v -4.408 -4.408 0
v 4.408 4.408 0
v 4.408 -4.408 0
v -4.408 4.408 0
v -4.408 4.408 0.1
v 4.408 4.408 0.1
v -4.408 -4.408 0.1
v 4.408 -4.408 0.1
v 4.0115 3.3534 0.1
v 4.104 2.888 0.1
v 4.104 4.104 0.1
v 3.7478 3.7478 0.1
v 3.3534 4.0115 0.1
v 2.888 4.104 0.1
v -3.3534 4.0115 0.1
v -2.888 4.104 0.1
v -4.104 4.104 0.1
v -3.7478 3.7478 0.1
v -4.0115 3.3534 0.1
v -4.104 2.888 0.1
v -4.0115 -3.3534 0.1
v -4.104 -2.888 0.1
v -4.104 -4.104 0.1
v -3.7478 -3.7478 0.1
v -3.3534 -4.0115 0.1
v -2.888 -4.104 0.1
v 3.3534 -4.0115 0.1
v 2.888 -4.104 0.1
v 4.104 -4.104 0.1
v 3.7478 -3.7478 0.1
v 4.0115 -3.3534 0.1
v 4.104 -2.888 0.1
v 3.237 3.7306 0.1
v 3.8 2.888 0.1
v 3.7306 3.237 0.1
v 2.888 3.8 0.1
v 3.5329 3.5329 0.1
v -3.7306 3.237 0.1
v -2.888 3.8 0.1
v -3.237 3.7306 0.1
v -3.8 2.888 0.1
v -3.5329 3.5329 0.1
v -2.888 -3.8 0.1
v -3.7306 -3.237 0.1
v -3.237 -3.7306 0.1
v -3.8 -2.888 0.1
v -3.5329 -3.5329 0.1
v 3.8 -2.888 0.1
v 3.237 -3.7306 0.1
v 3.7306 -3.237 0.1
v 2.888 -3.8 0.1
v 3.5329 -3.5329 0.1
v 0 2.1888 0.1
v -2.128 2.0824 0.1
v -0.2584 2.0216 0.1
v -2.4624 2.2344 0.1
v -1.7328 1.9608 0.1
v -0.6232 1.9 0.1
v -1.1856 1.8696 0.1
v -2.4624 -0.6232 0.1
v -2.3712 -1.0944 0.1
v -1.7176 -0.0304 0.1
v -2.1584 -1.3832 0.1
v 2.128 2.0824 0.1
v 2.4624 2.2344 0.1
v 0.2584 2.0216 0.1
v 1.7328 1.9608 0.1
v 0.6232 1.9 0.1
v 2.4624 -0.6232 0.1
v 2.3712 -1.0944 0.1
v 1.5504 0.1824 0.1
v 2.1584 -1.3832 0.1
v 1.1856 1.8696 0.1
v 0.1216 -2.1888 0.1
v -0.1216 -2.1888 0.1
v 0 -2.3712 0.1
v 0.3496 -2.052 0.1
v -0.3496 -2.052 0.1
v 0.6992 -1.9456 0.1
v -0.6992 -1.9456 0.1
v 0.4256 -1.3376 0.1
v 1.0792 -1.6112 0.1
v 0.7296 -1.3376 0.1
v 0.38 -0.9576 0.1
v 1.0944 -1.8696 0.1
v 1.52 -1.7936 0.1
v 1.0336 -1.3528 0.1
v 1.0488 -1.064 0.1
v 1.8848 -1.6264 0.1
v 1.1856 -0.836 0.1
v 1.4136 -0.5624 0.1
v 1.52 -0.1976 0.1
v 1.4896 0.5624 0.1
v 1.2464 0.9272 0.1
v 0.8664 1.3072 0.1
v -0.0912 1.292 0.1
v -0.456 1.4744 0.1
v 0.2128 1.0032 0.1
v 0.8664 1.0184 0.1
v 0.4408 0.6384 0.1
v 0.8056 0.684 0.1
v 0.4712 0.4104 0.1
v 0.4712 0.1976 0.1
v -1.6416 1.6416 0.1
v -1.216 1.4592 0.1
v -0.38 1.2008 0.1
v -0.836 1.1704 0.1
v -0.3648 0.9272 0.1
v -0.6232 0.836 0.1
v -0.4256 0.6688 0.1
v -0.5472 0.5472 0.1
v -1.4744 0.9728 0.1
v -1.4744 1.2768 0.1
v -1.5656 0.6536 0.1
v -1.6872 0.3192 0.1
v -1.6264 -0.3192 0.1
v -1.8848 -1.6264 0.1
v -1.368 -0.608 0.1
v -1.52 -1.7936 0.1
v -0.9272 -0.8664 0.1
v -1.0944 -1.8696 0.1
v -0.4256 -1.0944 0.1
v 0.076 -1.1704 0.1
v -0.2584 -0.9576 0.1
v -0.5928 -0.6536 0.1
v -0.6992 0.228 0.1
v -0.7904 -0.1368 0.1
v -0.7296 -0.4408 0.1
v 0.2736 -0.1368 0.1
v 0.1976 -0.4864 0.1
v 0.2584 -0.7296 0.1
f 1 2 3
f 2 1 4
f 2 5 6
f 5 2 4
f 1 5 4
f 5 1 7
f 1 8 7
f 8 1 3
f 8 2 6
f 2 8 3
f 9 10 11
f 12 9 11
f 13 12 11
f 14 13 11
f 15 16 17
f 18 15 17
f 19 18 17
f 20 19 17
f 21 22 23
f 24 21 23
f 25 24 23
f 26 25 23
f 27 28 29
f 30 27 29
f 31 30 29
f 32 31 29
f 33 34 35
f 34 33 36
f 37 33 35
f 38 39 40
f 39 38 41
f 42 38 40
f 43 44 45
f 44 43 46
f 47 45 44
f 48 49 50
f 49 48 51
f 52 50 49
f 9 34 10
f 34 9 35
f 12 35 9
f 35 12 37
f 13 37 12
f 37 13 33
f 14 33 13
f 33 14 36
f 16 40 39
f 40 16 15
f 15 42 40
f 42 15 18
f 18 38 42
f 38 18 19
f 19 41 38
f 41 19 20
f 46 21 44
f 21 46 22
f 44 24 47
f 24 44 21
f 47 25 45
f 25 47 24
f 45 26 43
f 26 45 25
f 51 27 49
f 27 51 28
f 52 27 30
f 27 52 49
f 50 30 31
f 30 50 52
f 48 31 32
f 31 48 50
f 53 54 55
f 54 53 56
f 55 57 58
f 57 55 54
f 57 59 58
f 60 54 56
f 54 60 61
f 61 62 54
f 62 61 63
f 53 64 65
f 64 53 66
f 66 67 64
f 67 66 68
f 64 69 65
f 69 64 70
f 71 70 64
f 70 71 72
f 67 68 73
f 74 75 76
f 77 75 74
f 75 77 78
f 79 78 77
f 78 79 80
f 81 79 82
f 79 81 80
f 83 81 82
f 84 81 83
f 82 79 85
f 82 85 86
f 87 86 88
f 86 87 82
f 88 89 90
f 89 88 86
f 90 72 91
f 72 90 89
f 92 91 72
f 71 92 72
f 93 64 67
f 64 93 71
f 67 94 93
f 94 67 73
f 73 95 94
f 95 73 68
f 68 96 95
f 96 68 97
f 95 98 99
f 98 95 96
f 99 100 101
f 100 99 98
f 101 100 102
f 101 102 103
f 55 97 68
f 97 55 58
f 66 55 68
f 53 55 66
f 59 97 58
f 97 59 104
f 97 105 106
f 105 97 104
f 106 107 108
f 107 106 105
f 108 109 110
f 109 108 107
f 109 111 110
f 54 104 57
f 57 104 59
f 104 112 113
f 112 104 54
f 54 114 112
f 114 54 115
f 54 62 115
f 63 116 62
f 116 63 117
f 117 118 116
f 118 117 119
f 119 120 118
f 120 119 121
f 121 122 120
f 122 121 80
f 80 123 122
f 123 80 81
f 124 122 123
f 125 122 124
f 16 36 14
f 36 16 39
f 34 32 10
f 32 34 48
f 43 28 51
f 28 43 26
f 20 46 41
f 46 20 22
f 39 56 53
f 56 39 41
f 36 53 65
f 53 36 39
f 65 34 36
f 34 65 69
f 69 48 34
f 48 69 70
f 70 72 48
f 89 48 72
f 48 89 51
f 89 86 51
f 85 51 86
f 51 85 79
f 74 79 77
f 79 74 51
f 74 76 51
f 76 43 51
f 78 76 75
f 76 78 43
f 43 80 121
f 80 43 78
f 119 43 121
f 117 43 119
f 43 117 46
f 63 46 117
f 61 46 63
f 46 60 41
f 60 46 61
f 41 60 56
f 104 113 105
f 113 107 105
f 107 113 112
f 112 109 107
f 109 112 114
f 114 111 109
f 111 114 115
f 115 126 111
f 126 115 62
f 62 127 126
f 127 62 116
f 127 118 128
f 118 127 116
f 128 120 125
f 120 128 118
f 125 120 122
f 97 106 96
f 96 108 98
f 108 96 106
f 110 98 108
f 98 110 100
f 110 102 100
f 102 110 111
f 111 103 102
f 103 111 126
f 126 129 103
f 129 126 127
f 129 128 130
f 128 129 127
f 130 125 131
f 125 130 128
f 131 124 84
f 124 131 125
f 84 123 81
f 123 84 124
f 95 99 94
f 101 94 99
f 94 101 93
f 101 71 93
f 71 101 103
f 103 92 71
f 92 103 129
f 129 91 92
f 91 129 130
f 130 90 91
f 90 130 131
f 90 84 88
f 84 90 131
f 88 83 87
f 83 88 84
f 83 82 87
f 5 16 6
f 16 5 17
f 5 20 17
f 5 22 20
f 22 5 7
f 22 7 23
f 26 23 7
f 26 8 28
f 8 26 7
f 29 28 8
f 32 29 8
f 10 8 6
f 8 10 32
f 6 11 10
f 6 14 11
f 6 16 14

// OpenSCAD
// file: ../p/box5-12.scad
use <../lib.scad>
function ldraw_lib__box5_12() = [
// 0 Box with 5 Faces without Any Edges
// 0 Name: box5-12.dat
// 0 Author: Chris Dee [cwdee]
// 0 !LDRAW_ORG Primitive UPDATE 2009-02
// 0 !LICENSE Licensed under CC BY 4.0 : see CAreadme.txt
// 
// 0 BFC CERTIFY CCW
  [0,"BFC","CERTIFY"],
  [0,"BFC","CCW"],
// 
// 0 !HISTORY 2009-09-03 [PTadmin] Official Update 2009-02
// 
// 
// 4 16 1 1 1 1 1 -1 -1 1 -1 -1 1 1
  [4,16,1,1,1,1,1,-1,-1,1,-1,-1,1,1],
// 4 16 -1 0 1 1 0 1 1 1 1 -1 1 1
  [4,16,-1,0,1,1,0,1,1,1,1,-1,1,1],
// 4 16 -1 0 -1 -1 0 1 -1 1 1 -1 1 -1
  [4,16,-1,0,-1,-1,0,1,-1,1,1,-1,1,-1],
// 4 16 1 0 -1 -1 0 -1 -1 1 -1 1 1 -1
  [4,16,1,0,-1,-1,0,-1,-1,1,-1,1,1,-1],
// 4 16 1 0 1 1 0 -1 1 1 -1 1 1 1
  [4,16,1,0,1,1,0,-1,1,1,-1,1,1,1],
// 0
];
module ldraw_lib__box5_12(step=0, col=false, unit=2/5, alt=false, line=0.2, solid=!$preview)
    makepoly(ldraw_lib__box5_12(), step=step, col=col, unit=unit, alt=alt, line=line, solid=solid);
ldraw_lib__box5_12(line=0.2);
// file: ../p/1-4ring3.scad
use <../lib.scad>
function ldraw_lib__1_4ring3() = [
// 0 Ring  3 x 0.25
// 0 Name: 1-4ring3.dat
// 0 Author: Willy Tschager [Holly-Wood]
// 0 !LDRAW_ORG Primitive UPDATE 2024-01
// 0 !LICENSE Licensed under CC BY 4.0 : see CAreadme.txt
// 
// 0 BFC CERTIFY CCW
  [0,"BFC","CERTIFY"],
  [0,"BFC","CCW"],
// 
// 0 !HISTORY 1999-07-05 [PTadmin] Official Update 1999-05
// 0 !HISTORY 2003-01-21 [cavehop] Update Added BFC and 1 digit of significance
// 0 !HISTORY 2003-05-21 [cavehop] Corrected values as indicated by pneaster
// 0 !HISTORY 2003-06-12 [cavehop] Re-corrected values as indicated by pneaster
// 0 !HISTORY 2003-08-01 [PTadmin] Official Update 2003-02
// 0 !HISTORY 2007-06-22 [PTadmin] Header formatted for Contributor Agreement
// 0 !HISTORY 2008-07-01 [PTadmin] Official Update 2008-01
// 0 !HISTORY 2012-02-16 [Philo] Changed to CCW
// 0 !HISTORY 2012-03-30 [PTadmin] Official Update 2012-01
// 0 !HISTORY 2024-01-04 [Holly-Wood] Complete re-write, original by Karim Nassar
// 0 !HISTORY 2024-01-29 [OrionP] Official Update 2024-01
// 
// 4 16 4 0 0 3.6956 0 1.5308 2.7717 0 1.1481 3 0 0
  [4,16,4,0,0,3.6956,0,1.5308,2.7717,0,1.1481,3,0,0],
// 4 16 3.6956 0 1.5308 2.8284 0 2.8284 2.1213 0 2.1213 2.7717 0 1.1481
  [4,16,3.6956,0,1.5308,2.8284,0,2.8284,2.1213,0,2.1213,2.7717,0,1.1481],
// 4 16 2.8284 0 2.8284 1.5308 0 3.6956 1.1481 0 2.7717 2.1213 0 2.1213
  [4,16,2.8284,0,2.8284,1.5308,0,3.6956,1.1481,0,2.7717,2.1213,0,2.1213],
// 4 16 1.5308 0 3.6956 0 0 4 0 0 3 1.1481 0 2.7717
  [4,16,1.5308,0,3.6956,0,0,4,0,0,3,1.1481,0,2.7717],
// 0 // Build by LDPartEditor (PrimGen 2.X)
];
module ldraw_lib__1_4ring3(step=0, col=false, unit=2/5, alt=false, line=0.2, solid=!$preview)
    makepoly(ldraw_lib__1_4ring3(), step=step, col=col, unit=unit, alt=alt, line=line, solid=solid);
ldraw_lib__1_4ring3(line=0.2);
// file: ../p/1-4ndis.scad
use <../lib.scad>
function ldraw_lib__1_4ndis() = [
// 0 Disc Negative 0.25
// 0 Name: 1-4ndis.dat
// 0 Author: James Jessiman
// 0 !LDRAW_ORG Primitive UPDATE 2012-01
// 0 !LICENSE Licensed under CC BY 4.0 : see CAreadme.txt
// 
// 0 BFC CERTIFY CCW
  [0,"BFC","CERTIFY"],
  [0,"BFC","CCW"],
// 
// 0 !HISTORY 2002-03-23 [sbliss] Added BFC Statement
// 0 !HISTORY 2002-04-25 [PTadmin] Official Update 2002-02
// 0 !HISTORY 2007-06-22 [PTadmin] Header formatted for Contributor Agreement
// 0 !HISTORY 2008-07-01 [PTadmin] Official Update 2008-01
// 0 !HISTORY 2012-02-16 [Philo] Changed to CCW
// 0 !HISTORY 2012-03-30 [PTadmin] Official Update 2012-01
// 
// 
// 3 16 0.9239 0 0.3827 1 0 0 1 0 1
  [3,16,0.9239,0,0.3827,1,0,0,1,0,1],
// 3 16 0.7071 0 0.7071 0.9239 0 0.3827 1 0 1
  [3,16,0.7071,0,0.7071,0.9239,0,0.3827,1,0,1],
// 3 16 0.3827 0 0.9239 0.7071 0 0.7071 1 0 1
  [3,16,0.3827,0,0.9239,0.7071,0,0.7071,1,0,1],
// 3 16 0 0 1 0.3827 0 0.9239 1 0 1
  [3,16,0,0,1,0.3827,0,0.9239,1,0,1],
];
module ldraw_lib__1_4ndis(step=0, col=false, unit=2/5, alt=false, line=0.2, solid=!$preview)
    makepoly(ldraw_lib__1_4ndis(), step=step, col=col, unit=unit, alt=alt, line=line, solid=solid);
ldraw_lib__1_4ndis(line=0.2);
// file: ../p/1-4chrd.scad
use <../lib.scad>
function ldraw_lib__1_4chrd() = [
// 0 Chord 0.25
// 0 Name: 1-4chrd.dat
// 0 Author: Max Martin Richter [MMR1988]
// 0 !LDRAW_ORG Primitive UPDATE 2023-05
// 0 !LICENSE Licensed under CC BY 4.0 : see CAreadme.txt
// 
// 0 BFC CERTIFY CCW
  [0,"BFC","CERTIFY"],
  [0,"BFC","CCW"],
// 
// 0 !HISTORY 2004-04-22 [PTadmin] Official Update 2004-02
// 0 !HISTORY 2007-10-09 [PTadmin] Header formatted for Contributor Agreement
// 0 !HISTORY 2008-07-01 [PTadmin] Official Update 2008-01
// 0 !HISTORY 2012-08-02 [MMR1988] Re-creation with PrimGen2 and Rectifier
// 0 !HISTORY 2012-08-09 [PTadmin] Official Update 2012-02
// 0 !HISTORY 2023-10-27 [OrionP] Change author to MMR1988 from hafhead
// 0 !HISTORY 2023-10-31 [OrionP] Official Update 2023-05
// 
// 4 16 0.9239 0 0.3827 0.3827 0 0.9239 0 0 1 1 0 0
  [4,16,0.9239,0,0.3827,0.3827,0,0.9239,0,0,1,1,0,0],
// 3 16 0.7071 0 0.7071 0.3827 0 0.9239 0.9239 0 0.3827
  [3,16,0.7071,0,0.7071,0.3827,0,0.9239,0.9239,0,0.3827],
];
module ldraw_lib__1_4chrd(step=0, col=false, unit=2/5, alt=false, line=0.2, solid=!$preview)
    makepoly(ldraw_lib__1_4chrd(), step=step, col=col, unit=unit, alt=alt, line=line, solid=solid);
ldraw_lib__1_4chrd(line=0.2);
// main file
use <../lib.scad>
use <168135h.scad>
function ldraw_lib__169575a() = [
// 0 Sticker  1.1 x  1.1 with Fire Logo Badge
// 0 Name: 169575a.dat
// 0 Author: Chris Böhnke [KnightOfTarenta]
// 0 !LDRAW_ORG Part UPDATE 2026-05
// 0 !LICENSE Licensed under CC BY 4.0 : see CAreadme.txt
// 
// 0 BFC CERTIFY CCW
  [0,"BFC","CERTIFY"],
  [0,"BFC","CCW"],
// 
// 0 !KEYWORDS Blaze Commander, Bricklink 6525stk01, BrickOwl 218159, Fire 1994
// 0 !KEYWORDS Fire Fighters, Fire Station, Rebrickable 169575, Set 6525, town
// 
// 0 !HISTORY 2026-05-31 [OrionP] Official Update 2026-05
// 
// 0 // Using 168135h.dat by Takeshi Takahashi [RainbowDolphin]
// 1 16 0 0 0 .38 0 0 0 1 0 0 0 .38 168135h.dat
  [1,16,0,0,0,.38,0,0,0,1,0,0,0,.38, ldraw_lib__168135h()],
];
module ldraw_lib__169575a(step=0, col=false, unit=2/5, alt=false, line=0.2, solid=!$preview)
    makepoly(ldraw_lib__169575a(), step=step, col=col, unit=unit, alt=alt, line=line, solid=solid);
ldraw_lib__169575a(line=0.2);
